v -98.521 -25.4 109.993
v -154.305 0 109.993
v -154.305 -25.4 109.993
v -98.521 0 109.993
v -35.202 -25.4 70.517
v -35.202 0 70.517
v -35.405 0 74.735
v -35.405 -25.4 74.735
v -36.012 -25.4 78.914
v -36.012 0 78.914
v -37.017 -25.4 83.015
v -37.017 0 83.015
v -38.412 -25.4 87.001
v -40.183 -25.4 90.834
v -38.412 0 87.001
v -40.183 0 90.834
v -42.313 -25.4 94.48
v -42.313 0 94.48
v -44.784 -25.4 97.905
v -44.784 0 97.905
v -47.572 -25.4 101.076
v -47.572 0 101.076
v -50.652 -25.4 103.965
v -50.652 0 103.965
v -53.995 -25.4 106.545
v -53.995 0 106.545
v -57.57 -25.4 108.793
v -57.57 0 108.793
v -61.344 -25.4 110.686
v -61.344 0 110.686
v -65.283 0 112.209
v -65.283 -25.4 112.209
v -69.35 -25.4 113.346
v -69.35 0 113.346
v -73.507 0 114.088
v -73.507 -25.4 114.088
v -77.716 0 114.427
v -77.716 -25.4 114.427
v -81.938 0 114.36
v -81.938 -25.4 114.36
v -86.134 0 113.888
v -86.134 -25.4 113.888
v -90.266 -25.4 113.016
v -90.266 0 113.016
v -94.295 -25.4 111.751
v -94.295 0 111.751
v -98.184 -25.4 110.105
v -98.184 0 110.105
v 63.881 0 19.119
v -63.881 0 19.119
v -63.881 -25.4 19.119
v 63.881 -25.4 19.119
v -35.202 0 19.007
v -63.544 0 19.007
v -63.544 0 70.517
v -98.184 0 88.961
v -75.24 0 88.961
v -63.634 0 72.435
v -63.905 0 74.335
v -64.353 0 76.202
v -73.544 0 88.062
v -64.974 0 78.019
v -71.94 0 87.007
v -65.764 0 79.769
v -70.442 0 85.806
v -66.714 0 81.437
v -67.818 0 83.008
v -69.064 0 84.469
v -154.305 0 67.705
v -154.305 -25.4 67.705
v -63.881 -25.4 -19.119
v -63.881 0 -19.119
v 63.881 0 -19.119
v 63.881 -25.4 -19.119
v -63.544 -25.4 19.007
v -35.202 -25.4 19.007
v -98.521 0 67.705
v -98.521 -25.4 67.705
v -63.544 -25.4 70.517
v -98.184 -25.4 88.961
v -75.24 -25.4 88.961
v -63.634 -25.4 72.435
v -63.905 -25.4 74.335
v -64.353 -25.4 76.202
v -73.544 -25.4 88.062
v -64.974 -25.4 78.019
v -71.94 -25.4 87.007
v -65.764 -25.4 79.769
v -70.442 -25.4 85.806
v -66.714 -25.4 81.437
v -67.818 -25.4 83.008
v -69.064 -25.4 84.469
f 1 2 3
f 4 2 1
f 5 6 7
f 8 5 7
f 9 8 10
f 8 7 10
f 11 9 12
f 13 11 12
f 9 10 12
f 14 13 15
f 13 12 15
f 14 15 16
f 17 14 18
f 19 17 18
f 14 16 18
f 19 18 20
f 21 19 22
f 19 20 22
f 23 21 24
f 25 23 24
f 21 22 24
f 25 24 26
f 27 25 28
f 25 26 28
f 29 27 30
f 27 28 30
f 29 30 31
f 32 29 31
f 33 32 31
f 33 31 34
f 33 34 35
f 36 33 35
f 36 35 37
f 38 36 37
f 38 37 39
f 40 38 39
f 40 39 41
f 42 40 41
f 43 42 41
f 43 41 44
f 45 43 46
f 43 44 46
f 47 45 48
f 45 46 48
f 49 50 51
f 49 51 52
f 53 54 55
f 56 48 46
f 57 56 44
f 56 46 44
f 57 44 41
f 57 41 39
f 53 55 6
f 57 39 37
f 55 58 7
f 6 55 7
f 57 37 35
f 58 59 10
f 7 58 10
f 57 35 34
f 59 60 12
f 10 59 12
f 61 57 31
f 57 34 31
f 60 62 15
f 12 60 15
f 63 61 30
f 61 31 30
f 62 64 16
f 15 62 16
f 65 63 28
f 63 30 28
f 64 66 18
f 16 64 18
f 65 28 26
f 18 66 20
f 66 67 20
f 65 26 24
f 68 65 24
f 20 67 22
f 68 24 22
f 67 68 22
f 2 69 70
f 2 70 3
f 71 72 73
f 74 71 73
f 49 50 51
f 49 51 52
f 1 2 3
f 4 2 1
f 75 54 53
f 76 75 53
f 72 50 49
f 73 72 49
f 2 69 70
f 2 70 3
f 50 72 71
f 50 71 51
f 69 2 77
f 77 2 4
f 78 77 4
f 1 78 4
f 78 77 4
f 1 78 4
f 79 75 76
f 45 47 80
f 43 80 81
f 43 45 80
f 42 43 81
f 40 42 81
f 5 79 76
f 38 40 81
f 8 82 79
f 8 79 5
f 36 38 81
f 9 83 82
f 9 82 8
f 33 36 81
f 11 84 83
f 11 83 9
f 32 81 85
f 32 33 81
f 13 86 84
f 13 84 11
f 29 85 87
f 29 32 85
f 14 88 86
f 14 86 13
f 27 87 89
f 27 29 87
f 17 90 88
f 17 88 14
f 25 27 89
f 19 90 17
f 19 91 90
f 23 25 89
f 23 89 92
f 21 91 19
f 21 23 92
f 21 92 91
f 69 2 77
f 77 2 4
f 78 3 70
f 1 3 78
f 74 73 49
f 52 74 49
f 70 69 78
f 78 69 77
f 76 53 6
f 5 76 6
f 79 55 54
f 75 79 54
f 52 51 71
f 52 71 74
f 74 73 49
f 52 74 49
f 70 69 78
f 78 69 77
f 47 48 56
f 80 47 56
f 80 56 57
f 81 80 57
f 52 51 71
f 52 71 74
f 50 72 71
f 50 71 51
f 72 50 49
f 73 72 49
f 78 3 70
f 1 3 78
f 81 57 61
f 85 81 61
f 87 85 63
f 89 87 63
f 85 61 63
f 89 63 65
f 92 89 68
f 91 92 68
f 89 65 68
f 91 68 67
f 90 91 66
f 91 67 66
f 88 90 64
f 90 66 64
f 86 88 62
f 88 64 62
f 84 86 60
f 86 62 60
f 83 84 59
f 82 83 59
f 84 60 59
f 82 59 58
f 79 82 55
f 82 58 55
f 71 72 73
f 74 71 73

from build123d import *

# Parameters (mm, degrees)
F0_W     = 127.7624070644
F0_H     = 38.2387563586
F2_DEPTH = 25.4
F0_W_2   = 55.7835698128
F0_H_2   = 42.2875583172
F3_DEPTH = 25.4


with BuildPart() as f2:
    # F0 (on Front) → F2 (new body)
    with BuildSketch(Plane.XZ):
        Rectangle(F0_W, F0_H)
    extrude(amount=F2_DEPTH)


with BuildPart() as f2b:
    # F0 (on Front) → F2, piece 2 (new body)
    with BuildSketch(Plane.XZ):
        with Locations((-126.4128237963, 88.8488590717)):
            Rectangle(F0_W_2, F0_H_2)
    extrude(amount=F2_DEPTH)


with BuildPart() as f2c:
    # F1 (on Front) → F2, piece 3 (new body)
    with BuildSketch(Plane.XZ):
        with BuildLine():
            Line((-63.5438114405, 70.5167576671), (-63.5438114405, 19.0069098026))
            Line((-63.5438114405, 19.0069098026), (-35.2021455765, 19.0069098026))
            Line((-35.2021455765, 19.0069098026), (-35.2021455765, 70.5167576671))
            ThreePointArc((-35.2021455765, 70.5167576671), (-55.755160611, 107.7118696892), (-98.183631897, 110.105112195))
            Line((-98.183631897, 110.105112195), (-98.183631897, 88.9613330364))
            Line((-98.183631897, 88.9613330364), (-75.2403661609, 88.9613330364))
            ThreePointArc((-75.2403661609, 88.9613330364), (-66.7144537907, 81.437057032), (-63.5438114405, 70.5167576671))
        make_face()
    extrude(amount=F2_DEPTH)


with BuildPart() as f3:
    # F0 (on Front) → F3 (new body)
    with BuildSketch(Plane.XZ):
        Rectangle(F0_W, F0_H)
    extrude(amount=F3_DEPTH)


with BuildPart() as f3b:
    # F0 (on Front) → F3, piece 2 (new body)
    with BuildSketch(Plane.XZ):
        with Locations((-126.4128237963, 88.8488590717)):
            Rectangle(F0_W_2, F0_H_2)
    extrude(amount=F3_DEPTH)


solid = Compound([f2.part, f2b.part, f2c.part, f3.part, f3b.part])
